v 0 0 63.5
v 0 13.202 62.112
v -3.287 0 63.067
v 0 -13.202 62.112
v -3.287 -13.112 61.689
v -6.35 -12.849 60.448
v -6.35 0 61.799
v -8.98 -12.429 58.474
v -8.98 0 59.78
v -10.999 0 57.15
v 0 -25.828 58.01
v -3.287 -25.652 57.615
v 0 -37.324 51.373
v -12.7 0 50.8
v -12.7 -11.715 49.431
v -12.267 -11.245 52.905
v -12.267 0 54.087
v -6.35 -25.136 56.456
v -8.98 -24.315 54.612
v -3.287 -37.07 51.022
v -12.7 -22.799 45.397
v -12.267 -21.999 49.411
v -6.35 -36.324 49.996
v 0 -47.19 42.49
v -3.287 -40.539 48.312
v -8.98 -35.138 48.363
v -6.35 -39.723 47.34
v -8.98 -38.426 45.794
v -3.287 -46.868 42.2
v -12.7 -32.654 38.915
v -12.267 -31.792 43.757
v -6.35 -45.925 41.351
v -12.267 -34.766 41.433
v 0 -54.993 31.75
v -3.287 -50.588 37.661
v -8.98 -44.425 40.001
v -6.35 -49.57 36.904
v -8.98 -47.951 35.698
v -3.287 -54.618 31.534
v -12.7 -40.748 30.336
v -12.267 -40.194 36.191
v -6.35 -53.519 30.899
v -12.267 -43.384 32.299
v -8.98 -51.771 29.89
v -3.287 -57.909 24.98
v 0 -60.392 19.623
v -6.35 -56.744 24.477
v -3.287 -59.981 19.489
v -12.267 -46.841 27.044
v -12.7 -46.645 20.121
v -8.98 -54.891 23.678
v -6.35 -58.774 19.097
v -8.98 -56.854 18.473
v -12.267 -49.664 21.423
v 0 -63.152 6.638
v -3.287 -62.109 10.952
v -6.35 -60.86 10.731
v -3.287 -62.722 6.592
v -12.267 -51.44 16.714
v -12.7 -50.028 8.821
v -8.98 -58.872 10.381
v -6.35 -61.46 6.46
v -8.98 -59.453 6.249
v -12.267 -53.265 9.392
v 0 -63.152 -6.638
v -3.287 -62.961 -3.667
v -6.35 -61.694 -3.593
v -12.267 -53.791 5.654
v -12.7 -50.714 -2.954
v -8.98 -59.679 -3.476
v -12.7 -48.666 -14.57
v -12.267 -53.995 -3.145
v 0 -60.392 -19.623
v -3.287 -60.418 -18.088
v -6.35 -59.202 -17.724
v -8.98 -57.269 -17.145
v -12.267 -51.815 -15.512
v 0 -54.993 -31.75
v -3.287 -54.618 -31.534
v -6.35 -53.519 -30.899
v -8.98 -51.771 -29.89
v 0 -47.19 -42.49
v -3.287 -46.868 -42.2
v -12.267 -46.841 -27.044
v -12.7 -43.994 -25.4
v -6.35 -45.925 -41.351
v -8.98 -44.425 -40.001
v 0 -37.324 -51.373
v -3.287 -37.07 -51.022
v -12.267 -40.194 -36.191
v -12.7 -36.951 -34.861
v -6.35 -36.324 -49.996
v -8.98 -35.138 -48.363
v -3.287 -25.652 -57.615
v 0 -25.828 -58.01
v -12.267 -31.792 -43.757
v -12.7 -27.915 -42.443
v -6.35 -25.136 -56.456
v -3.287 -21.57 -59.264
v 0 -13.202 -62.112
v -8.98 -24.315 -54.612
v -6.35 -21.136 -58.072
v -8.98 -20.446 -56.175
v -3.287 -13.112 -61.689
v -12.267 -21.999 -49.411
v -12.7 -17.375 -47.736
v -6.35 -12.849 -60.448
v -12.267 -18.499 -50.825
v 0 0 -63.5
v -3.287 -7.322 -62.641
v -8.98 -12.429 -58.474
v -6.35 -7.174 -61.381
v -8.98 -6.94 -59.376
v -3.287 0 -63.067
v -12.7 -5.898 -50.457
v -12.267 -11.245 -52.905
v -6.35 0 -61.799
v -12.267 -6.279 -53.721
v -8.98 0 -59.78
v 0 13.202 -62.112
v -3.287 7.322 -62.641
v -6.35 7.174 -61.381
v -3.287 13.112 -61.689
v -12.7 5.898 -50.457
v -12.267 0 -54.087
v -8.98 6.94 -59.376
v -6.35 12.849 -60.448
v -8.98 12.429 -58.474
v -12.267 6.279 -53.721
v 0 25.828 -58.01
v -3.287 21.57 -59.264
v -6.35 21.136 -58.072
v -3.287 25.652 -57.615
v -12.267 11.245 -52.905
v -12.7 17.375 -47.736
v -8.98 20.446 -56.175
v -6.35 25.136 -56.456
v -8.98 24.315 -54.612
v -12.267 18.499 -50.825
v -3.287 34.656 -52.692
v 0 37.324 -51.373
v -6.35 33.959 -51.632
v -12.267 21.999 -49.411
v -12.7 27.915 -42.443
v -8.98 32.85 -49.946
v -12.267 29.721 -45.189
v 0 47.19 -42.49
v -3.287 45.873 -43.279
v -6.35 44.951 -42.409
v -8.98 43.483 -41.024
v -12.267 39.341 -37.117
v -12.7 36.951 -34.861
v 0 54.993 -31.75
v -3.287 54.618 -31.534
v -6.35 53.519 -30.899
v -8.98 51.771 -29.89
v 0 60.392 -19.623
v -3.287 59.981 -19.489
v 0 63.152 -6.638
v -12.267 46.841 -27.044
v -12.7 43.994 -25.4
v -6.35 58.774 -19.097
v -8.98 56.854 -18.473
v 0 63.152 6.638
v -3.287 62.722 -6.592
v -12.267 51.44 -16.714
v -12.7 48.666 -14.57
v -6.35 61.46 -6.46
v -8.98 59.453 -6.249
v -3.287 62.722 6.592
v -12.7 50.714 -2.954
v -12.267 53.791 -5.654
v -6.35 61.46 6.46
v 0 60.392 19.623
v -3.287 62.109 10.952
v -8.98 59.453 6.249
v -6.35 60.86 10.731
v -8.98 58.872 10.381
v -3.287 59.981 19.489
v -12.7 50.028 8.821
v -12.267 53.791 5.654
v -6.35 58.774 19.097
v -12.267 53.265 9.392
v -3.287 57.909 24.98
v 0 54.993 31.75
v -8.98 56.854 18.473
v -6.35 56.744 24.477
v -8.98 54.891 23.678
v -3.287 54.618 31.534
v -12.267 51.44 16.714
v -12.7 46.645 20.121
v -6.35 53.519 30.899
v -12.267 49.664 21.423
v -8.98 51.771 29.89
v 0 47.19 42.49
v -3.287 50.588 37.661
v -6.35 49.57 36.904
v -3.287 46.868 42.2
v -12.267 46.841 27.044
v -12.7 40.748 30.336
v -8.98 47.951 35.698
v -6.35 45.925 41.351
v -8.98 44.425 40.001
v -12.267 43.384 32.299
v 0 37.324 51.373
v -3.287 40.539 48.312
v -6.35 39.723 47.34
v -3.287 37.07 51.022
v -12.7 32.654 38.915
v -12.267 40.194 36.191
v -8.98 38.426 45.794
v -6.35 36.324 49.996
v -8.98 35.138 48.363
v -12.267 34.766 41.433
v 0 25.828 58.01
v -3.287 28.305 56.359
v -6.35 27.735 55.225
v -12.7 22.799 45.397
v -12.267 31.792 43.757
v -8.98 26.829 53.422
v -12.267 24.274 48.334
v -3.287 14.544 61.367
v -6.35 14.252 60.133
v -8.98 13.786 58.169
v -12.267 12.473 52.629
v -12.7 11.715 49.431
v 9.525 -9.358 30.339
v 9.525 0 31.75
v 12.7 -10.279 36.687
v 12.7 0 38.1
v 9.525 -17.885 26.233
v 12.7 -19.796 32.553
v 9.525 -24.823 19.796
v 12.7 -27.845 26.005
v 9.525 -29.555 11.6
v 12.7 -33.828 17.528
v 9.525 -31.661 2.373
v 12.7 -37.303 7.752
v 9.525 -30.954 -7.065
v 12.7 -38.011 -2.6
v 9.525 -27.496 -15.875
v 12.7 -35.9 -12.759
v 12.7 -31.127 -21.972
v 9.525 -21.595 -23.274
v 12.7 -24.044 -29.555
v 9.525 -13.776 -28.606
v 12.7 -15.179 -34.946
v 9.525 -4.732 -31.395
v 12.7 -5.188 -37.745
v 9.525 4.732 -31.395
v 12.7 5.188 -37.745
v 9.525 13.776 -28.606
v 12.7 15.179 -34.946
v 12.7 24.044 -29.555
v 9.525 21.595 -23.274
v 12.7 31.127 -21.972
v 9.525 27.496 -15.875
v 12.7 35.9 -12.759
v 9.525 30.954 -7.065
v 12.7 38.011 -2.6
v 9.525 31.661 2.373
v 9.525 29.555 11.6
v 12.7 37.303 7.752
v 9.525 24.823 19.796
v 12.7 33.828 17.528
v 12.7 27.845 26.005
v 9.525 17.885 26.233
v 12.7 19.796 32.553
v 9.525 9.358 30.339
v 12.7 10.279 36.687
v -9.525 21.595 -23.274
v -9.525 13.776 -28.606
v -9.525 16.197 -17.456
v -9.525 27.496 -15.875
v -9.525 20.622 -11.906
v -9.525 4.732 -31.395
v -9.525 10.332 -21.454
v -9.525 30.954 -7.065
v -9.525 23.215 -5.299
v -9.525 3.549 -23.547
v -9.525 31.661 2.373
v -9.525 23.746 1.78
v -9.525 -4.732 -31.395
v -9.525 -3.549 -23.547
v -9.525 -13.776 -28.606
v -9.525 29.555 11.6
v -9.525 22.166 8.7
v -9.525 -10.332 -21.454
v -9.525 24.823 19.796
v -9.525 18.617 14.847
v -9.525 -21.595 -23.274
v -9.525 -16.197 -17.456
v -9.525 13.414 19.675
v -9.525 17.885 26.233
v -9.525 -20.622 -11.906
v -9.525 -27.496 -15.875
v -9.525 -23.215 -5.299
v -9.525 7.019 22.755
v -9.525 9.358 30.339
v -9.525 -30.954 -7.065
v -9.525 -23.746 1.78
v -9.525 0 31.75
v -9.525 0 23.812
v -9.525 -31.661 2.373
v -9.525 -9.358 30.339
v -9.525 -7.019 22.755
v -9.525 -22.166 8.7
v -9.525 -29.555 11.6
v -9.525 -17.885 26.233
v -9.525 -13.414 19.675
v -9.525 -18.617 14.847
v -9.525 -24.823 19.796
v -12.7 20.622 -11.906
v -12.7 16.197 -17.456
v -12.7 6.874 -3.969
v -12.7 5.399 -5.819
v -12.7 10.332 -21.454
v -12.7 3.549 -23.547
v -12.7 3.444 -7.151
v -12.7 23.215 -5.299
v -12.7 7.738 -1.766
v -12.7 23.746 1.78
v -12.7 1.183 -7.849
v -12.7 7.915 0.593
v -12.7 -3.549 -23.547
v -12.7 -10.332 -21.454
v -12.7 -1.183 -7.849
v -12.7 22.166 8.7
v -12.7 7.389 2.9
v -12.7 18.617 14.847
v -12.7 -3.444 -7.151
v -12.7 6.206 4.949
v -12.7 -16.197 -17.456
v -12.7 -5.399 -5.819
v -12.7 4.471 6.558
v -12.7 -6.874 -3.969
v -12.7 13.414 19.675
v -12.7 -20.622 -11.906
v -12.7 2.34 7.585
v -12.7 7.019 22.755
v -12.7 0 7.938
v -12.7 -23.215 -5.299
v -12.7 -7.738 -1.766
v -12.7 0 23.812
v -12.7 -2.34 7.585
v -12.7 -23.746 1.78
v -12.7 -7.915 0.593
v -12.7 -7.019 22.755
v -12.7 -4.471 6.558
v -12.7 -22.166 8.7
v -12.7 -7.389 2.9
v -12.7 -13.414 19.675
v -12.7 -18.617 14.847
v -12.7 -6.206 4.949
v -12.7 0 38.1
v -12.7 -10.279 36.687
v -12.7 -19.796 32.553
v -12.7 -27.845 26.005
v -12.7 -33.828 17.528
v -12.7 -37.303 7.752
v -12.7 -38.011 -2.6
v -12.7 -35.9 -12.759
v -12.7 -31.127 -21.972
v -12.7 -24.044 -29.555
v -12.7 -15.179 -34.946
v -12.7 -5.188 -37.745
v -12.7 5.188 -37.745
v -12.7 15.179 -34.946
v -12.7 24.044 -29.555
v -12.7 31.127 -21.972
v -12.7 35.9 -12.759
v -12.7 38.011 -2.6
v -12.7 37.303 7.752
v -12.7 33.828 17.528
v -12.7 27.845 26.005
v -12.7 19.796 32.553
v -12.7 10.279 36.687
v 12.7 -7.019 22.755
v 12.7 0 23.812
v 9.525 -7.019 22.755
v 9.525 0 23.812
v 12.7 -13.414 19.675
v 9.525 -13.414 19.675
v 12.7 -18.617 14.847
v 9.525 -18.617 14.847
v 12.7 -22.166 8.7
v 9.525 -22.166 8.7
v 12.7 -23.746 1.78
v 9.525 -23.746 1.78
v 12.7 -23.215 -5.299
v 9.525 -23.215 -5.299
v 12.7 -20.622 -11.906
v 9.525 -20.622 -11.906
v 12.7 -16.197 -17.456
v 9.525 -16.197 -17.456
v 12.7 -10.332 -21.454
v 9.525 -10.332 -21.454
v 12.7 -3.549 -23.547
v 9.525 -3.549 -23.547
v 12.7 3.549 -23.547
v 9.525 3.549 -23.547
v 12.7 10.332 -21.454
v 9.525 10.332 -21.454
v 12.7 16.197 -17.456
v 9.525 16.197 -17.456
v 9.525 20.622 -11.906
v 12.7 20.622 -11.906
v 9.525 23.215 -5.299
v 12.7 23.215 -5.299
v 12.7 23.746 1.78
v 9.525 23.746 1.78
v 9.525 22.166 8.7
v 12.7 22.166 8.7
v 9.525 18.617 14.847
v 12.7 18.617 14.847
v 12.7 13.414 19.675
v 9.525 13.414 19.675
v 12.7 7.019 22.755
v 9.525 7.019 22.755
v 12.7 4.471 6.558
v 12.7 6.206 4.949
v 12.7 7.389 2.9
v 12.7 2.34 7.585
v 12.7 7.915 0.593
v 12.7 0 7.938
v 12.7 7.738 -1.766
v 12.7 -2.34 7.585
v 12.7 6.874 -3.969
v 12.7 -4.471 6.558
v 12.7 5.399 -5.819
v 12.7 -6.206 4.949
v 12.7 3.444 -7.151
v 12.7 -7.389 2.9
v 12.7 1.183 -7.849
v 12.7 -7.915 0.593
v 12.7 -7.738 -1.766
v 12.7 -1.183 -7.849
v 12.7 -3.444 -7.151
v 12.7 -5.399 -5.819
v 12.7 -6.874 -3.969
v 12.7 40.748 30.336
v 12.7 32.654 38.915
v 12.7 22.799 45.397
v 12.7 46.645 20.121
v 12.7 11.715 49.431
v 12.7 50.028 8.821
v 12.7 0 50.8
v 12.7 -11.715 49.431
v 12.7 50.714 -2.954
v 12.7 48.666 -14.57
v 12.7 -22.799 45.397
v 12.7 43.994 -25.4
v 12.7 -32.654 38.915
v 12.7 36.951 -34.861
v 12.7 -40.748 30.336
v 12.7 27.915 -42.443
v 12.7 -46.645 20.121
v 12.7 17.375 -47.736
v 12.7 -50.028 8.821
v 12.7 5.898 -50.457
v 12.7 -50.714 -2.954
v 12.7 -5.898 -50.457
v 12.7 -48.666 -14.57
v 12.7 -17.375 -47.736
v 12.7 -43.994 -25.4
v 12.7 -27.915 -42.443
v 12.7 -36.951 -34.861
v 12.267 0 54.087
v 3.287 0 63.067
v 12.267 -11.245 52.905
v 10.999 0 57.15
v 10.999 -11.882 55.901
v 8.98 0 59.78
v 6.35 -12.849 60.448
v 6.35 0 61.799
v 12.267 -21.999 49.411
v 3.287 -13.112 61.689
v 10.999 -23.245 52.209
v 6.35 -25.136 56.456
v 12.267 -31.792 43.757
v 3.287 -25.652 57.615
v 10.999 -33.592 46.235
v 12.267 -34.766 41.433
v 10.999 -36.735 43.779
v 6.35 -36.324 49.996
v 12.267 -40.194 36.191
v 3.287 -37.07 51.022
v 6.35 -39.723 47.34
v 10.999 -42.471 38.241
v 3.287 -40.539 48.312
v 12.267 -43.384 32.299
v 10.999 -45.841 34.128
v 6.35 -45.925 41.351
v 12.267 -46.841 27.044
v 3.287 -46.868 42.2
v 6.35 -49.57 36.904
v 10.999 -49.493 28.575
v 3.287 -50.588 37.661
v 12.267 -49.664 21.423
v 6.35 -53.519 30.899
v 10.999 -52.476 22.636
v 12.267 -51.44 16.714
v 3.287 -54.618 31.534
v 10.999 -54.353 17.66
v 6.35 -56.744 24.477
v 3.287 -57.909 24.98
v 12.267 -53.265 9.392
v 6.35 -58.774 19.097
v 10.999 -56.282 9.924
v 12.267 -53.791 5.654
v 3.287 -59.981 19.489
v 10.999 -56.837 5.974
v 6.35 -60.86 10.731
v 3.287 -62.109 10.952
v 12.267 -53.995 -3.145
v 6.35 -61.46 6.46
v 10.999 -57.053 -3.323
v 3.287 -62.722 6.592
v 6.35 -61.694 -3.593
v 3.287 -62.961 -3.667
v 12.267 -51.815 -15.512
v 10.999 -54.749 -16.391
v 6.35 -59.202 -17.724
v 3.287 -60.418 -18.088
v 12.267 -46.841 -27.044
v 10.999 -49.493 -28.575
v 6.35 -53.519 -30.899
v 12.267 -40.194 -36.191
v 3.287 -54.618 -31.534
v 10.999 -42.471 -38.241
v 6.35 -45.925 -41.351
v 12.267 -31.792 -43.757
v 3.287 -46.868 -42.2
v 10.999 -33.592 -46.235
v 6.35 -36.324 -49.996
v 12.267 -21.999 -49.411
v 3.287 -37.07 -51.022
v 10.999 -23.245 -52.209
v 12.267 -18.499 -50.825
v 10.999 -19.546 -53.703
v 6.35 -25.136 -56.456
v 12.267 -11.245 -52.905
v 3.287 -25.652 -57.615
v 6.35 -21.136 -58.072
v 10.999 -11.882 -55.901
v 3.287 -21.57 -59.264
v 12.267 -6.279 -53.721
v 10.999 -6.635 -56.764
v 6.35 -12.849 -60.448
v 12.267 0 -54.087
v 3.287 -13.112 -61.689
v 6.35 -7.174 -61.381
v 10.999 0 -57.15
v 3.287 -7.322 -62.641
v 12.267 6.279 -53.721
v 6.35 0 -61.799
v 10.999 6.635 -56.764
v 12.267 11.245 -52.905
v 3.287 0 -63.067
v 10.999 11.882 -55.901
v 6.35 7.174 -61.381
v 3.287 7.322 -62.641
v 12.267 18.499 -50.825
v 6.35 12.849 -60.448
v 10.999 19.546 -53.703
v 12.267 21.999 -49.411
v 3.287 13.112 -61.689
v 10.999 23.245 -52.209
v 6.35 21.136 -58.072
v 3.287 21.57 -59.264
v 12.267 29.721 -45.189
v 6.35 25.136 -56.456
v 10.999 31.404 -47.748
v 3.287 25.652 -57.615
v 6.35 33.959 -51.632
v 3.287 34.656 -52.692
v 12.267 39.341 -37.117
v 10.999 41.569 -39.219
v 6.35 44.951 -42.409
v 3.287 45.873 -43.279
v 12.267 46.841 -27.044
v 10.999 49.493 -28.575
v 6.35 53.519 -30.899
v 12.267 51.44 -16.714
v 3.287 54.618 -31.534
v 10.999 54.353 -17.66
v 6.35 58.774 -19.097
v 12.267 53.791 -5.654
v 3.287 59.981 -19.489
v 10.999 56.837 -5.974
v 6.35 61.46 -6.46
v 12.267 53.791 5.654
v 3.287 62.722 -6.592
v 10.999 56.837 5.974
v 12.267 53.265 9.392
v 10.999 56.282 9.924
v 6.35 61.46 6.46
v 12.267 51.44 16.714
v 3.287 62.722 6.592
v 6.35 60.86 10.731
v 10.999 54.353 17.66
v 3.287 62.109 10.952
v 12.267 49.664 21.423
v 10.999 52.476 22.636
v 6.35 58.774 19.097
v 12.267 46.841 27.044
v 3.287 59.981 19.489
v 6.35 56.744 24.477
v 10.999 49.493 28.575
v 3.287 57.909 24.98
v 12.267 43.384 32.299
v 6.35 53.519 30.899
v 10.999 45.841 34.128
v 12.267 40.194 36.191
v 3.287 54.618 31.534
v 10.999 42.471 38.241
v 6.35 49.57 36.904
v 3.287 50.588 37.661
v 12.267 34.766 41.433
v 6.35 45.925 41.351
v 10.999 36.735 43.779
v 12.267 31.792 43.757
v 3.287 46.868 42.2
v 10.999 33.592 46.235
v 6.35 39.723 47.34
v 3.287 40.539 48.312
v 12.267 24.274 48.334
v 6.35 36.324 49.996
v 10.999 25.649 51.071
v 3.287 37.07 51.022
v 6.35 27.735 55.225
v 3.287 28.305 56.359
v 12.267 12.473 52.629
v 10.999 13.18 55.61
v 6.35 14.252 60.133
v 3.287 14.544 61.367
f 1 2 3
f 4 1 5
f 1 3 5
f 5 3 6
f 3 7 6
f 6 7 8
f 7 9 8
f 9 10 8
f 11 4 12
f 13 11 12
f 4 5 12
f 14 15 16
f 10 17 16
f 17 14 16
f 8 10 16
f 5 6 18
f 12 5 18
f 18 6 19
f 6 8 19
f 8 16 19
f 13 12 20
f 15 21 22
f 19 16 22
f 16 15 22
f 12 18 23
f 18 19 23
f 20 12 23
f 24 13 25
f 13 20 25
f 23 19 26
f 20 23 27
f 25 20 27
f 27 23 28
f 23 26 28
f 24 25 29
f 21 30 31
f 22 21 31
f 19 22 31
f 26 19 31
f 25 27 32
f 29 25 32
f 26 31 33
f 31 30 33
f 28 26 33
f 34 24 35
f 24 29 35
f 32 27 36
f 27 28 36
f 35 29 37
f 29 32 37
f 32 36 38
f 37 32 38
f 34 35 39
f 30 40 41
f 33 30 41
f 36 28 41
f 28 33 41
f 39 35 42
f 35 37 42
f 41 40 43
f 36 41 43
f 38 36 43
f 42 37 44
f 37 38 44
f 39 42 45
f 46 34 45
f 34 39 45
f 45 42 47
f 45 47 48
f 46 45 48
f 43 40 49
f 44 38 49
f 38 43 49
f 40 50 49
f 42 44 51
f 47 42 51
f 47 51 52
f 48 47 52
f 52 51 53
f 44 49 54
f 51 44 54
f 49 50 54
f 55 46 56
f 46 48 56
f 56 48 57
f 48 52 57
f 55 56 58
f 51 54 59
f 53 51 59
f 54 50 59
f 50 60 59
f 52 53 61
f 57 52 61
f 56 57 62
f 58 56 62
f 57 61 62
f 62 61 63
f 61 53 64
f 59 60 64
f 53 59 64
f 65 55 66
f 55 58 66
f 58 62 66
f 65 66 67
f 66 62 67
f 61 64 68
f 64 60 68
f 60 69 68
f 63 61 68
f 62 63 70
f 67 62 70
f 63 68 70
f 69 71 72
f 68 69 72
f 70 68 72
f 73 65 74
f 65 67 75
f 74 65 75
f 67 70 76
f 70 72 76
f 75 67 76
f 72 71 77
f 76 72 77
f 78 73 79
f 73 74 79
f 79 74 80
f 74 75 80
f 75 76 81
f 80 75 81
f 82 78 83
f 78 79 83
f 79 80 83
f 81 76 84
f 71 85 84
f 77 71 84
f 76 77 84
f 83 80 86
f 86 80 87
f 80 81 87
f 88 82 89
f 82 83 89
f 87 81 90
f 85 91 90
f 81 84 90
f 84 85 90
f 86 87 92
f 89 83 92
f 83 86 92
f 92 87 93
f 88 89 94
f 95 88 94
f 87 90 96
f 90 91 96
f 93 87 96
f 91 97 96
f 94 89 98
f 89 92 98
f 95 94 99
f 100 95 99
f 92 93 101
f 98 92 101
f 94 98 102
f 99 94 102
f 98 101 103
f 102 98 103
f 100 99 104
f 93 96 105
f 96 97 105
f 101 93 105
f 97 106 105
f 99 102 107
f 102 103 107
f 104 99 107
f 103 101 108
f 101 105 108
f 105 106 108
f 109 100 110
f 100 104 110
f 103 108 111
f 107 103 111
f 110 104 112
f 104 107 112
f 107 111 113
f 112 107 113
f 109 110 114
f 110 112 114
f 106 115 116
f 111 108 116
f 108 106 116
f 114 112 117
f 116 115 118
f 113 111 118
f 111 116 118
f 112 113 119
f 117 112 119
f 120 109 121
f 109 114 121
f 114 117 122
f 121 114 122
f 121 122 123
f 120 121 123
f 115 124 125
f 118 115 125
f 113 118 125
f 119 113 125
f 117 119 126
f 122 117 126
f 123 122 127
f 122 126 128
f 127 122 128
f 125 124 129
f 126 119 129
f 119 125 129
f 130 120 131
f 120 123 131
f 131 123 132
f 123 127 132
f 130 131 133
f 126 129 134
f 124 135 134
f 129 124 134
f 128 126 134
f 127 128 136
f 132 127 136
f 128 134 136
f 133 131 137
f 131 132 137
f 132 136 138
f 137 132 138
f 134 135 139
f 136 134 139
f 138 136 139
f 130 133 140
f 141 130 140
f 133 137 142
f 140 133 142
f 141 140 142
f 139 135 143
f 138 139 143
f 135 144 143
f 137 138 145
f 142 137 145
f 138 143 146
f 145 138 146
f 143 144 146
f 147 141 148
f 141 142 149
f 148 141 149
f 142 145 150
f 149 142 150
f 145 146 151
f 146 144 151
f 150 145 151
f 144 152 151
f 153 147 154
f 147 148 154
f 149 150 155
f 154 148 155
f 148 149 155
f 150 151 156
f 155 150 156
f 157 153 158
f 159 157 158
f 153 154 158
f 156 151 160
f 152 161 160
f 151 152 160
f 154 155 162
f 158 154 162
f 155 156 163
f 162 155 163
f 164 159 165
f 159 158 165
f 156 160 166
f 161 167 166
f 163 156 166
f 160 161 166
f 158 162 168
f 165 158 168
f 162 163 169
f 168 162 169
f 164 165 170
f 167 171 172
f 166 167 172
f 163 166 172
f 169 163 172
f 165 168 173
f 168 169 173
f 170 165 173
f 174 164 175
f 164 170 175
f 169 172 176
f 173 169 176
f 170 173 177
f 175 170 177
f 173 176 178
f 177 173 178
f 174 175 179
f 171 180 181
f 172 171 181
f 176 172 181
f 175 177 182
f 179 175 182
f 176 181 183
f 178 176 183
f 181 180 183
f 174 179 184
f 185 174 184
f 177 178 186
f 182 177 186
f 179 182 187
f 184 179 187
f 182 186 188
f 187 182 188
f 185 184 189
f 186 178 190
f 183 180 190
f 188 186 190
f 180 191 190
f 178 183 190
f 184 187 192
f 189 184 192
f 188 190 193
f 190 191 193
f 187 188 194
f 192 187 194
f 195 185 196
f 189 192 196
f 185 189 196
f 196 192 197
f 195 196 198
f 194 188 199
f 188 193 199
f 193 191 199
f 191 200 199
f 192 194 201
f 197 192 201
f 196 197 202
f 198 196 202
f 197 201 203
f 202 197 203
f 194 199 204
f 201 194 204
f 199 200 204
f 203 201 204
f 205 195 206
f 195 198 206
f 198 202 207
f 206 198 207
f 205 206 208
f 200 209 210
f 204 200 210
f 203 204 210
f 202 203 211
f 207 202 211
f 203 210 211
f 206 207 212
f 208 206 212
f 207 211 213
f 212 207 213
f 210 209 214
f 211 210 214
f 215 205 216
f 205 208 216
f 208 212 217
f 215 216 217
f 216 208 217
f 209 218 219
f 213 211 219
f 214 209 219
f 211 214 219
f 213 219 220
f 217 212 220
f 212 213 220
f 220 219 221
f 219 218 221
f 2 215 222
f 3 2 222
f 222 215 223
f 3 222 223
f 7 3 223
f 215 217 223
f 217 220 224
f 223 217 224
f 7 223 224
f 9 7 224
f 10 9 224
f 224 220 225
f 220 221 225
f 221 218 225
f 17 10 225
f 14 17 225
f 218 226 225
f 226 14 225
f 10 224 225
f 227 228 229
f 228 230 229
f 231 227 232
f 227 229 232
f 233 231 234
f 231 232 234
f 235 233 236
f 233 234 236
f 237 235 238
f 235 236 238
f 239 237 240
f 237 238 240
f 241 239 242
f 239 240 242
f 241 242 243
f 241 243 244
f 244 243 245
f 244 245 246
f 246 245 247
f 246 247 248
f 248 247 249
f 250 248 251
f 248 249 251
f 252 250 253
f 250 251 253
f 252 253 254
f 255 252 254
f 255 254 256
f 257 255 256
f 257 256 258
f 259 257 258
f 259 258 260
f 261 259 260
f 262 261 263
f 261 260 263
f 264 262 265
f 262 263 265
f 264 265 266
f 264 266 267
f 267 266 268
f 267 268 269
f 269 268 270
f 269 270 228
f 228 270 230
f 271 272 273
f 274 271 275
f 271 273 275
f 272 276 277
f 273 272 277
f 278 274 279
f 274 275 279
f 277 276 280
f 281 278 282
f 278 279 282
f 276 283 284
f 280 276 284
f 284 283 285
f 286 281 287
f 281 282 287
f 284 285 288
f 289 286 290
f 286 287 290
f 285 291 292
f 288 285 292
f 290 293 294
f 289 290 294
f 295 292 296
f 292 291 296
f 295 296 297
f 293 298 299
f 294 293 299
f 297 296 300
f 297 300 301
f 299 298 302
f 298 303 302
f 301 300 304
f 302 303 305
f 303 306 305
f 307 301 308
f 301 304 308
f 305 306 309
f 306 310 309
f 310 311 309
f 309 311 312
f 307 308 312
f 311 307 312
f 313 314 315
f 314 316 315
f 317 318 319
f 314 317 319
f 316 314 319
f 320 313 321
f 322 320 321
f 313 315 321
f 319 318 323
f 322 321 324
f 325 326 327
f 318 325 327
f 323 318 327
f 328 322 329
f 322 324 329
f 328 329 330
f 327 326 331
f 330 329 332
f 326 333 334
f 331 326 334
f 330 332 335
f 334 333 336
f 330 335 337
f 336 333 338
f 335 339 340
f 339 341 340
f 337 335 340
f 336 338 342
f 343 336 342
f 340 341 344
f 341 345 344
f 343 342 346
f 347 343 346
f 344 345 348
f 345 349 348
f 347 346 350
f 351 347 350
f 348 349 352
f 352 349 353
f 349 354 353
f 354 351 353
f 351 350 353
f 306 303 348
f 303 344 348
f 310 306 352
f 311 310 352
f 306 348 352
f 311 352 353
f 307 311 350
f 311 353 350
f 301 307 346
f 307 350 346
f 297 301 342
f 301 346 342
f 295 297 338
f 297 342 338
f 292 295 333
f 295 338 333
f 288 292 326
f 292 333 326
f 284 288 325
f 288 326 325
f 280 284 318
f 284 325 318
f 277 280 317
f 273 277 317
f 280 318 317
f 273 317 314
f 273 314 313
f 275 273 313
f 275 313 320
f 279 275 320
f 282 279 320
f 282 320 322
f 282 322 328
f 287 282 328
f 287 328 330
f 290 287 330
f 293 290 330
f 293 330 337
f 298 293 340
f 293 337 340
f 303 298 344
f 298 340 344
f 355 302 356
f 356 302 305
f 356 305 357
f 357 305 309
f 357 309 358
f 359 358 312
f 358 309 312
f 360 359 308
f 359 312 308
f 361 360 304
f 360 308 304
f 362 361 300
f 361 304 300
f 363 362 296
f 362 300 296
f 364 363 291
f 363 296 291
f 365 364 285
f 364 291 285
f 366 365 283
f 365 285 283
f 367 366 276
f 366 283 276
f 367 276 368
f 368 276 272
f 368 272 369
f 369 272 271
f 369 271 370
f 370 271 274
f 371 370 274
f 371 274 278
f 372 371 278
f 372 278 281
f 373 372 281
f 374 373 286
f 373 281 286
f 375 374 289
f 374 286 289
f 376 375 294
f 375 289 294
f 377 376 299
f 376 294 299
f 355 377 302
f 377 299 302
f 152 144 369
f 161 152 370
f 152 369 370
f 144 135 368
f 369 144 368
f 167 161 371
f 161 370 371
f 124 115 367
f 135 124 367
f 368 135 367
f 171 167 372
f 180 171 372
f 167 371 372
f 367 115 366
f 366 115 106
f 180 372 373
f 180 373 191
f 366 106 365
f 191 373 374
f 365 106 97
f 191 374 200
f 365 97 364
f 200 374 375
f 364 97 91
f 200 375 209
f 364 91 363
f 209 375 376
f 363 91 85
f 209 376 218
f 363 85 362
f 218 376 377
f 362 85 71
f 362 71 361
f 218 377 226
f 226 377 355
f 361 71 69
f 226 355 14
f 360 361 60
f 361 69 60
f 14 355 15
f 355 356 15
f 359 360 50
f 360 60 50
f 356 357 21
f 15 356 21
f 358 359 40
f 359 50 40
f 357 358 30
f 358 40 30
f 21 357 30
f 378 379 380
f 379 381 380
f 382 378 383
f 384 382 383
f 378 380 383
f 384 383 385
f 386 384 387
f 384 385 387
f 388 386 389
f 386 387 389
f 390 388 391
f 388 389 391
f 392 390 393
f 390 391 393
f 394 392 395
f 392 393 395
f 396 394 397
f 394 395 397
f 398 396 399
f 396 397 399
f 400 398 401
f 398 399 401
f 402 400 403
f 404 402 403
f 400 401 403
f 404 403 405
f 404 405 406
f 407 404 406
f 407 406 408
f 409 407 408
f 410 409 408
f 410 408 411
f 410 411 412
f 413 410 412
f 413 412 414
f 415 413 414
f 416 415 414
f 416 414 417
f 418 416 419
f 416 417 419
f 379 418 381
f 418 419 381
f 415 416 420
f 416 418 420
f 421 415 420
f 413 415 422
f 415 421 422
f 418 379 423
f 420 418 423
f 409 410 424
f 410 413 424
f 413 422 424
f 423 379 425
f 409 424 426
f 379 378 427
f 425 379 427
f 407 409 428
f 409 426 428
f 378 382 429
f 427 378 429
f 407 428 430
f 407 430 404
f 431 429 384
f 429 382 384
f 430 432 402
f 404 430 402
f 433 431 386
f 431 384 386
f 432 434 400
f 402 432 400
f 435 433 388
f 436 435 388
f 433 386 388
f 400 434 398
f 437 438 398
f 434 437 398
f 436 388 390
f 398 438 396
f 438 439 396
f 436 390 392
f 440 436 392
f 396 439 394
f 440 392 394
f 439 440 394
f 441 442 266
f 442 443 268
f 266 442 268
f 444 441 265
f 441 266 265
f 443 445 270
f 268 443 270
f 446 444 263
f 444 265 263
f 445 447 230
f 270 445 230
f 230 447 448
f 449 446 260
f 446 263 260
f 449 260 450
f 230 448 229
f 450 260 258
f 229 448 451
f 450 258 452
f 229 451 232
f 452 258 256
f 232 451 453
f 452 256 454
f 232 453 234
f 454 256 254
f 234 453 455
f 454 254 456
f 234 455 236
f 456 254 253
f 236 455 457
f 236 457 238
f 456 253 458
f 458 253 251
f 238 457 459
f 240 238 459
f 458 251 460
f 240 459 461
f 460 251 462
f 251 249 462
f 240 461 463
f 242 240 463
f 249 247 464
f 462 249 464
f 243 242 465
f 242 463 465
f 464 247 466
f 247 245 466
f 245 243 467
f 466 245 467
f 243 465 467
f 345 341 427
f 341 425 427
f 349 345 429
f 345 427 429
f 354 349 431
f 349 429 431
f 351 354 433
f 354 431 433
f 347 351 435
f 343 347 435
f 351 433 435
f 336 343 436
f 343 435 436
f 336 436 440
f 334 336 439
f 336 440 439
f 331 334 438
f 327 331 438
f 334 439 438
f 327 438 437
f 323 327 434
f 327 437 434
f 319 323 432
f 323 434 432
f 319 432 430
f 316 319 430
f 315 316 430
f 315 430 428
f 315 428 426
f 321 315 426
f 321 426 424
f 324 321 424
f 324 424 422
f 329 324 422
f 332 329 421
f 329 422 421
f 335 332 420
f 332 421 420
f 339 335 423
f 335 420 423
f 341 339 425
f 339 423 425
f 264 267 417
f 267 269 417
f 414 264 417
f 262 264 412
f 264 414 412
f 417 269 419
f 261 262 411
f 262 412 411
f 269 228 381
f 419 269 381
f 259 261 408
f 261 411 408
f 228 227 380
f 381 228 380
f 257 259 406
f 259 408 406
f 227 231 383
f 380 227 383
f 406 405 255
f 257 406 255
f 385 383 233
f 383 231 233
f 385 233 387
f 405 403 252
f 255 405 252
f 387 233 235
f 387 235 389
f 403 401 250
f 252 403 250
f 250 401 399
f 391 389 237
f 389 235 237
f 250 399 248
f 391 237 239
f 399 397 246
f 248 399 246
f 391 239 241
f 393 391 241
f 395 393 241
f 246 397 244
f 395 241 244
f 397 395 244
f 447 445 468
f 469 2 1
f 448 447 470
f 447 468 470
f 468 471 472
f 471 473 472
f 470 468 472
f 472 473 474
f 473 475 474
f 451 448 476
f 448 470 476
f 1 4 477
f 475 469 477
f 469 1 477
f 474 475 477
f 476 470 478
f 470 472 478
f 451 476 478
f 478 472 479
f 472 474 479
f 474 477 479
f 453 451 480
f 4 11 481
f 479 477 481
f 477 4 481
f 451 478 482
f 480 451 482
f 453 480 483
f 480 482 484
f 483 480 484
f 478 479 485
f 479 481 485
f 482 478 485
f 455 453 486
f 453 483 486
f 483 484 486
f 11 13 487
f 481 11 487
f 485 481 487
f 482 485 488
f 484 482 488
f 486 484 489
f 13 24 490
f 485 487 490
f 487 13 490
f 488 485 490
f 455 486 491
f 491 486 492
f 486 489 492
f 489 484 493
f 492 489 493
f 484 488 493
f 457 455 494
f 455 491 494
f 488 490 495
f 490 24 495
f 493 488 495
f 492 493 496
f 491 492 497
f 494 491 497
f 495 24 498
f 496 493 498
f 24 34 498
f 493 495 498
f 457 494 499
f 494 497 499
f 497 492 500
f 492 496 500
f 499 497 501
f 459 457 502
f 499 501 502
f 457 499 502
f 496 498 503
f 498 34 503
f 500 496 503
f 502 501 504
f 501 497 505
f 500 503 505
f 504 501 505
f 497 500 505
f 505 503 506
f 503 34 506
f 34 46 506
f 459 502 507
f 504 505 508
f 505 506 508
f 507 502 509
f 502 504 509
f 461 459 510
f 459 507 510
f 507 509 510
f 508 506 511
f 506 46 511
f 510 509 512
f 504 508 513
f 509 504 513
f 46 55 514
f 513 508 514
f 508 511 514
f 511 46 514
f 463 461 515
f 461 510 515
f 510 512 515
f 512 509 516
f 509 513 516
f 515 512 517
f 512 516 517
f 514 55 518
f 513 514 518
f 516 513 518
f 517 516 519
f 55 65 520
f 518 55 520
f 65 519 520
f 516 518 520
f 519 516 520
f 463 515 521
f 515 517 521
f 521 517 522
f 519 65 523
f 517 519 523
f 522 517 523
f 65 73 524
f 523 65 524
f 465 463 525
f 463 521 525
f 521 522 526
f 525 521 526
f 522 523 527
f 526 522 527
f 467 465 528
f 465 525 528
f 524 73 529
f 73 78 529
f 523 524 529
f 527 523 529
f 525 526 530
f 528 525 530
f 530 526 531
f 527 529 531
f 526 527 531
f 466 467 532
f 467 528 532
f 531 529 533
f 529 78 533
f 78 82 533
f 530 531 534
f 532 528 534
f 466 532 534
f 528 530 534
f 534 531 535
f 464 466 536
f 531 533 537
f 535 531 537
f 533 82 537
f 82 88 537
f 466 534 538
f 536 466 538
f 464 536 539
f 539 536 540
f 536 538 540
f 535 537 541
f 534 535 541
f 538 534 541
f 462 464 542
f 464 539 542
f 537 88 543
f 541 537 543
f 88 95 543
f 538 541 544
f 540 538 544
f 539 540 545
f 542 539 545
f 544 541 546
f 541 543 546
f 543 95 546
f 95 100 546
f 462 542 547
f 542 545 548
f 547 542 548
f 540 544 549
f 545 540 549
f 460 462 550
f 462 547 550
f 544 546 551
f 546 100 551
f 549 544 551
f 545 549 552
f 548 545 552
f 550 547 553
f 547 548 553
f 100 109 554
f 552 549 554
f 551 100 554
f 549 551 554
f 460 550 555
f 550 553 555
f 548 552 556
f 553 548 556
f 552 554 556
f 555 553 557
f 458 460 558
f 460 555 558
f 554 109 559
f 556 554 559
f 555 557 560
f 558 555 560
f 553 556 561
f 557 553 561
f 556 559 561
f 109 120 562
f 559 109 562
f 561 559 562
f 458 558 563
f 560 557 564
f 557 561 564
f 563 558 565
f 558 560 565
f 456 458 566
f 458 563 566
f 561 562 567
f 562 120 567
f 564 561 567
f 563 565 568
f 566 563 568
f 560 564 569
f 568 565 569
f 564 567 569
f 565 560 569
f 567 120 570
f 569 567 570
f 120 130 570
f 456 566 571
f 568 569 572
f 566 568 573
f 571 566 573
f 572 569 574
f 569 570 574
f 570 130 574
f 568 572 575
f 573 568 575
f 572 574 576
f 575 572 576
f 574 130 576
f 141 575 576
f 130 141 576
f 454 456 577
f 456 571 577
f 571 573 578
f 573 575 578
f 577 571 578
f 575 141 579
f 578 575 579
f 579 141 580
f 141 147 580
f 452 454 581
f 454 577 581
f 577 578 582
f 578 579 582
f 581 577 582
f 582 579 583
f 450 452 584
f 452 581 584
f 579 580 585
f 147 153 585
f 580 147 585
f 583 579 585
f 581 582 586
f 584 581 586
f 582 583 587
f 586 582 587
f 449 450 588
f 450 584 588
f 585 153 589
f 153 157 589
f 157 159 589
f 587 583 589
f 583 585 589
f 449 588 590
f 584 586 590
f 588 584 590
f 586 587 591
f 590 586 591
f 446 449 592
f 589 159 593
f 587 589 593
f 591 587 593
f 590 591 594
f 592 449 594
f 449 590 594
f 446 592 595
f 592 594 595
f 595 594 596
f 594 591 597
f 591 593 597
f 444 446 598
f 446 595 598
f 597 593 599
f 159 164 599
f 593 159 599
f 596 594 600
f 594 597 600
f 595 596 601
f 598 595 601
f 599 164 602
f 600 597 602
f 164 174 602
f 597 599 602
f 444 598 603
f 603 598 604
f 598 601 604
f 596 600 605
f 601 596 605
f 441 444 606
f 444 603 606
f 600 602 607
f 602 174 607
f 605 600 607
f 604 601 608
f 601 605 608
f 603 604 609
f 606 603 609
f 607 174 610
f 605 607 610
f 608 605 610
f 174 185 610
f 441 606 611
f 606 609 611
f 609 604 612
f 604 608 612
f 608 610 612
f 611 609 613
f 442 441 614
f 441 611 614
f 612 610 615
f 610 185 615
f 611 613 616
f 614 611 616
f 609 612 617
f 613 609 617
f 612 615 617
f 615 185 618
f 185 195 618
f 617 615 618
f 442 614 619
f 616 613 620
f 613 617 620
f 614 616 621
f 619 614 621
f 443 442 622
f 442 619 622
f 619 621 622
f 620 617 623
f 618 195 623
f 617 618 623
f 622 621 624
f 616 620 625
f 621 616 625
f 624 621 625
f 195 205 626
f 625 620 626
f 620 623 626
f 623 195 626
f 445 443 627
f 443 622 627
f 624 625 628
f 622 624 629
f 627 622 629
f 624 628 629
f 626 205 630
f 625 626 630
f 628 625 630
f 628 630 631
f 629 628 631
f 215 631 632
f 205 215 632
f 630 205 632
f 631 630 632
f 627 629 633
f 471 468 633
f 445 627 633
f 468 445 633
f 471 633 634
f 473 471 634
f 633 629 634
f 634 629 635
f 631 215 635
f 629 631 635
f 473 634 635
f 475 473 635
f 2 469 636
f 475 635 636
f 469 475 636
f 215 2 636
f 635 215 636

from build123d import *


with BuildPart() as f1:
    # F0 (on Front) → F1 (revolve)
    with BuildSketch(Plane.XZ):
        with BuildLine():
            Line((-12.7, 7.9375), (0, 7.9375))
            Line((0, 7.9375), (12.7, 7.9375))
            Line((12.7, 7.9375), (12.7, 23.8125))
            Line((12.7, 23.8125), (9.525, 23.8125))
            Line((9.525, 23.8125), (9.525, 31.75))
            Line((9.525, 31.75), (12.7, 38.1))
            Line((12.7, 38.1), (12.7, 50.8))
            ThreePointArc((12.7, 50.8), (8.980256, 59.780256), (0, 63.5))
            ThreePointArc((0, 63.5), (-8.980256, 59.780256), (-12.7, 50.8))
            Line((-12.7, 50.8), (-12.7, 38.1))
            Line((-12.7, 38.1), (-9.525, 31.75))
            Line((-9.525, 31.75), (-9.525, 23.8125))
            Line((-9.525, 23.8125), (-12.7, 23.8125))
            Line((-12.7, 23.8125), (-12.7, 7.9375))
        make_face()
    revolve(axis=Axis((-3.268924, 0, 0), (1, 0, 0)))


solid = f1.part
